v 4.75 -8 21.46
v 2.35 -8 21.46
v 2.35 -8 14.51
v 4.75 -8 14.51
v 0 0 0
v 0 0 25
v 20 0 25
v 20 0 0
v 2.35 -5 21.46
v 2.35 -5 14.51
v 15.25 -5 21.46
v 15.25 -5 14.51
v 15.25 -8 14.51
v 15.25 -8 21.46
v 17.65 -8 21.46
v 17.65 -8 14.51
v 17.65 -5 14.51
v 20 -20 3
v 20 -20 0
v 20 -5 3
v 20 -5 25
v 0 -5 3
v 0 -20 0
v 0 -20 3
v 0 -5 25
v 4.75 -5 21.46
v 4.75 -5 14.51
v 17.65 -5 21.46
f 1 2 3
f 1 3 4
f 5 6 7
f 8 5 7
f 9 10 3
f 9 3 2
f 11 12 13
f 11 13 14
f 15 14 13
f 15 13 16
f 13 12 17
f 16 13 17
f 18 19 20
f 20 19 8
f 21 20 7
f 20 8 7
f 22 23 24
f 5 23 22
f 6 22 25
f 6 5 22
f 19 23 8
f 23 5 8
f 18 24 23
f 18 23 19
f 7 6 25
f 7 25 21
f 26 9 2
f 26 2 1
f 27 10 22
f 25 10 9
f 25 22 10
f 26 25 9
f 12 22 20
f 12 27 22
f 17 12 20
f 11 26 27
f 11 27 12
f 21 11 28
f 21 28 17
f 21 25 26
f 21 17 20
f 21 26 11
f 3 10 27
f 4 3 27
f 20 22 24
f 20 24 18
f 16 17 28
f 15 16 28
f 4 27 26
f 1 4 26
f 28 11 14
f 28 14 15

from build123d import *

# Parameters (mm, degrees)
F0_W     = 20
F0_H     = 25
F1_DEPTH = 5
F2_W     = 20
F2_H     = 3
F3_DEPTH = 15
F4_W     = 2.4
F4_H     = 6.95
F5_DEPTH = 3


with BuildPart() as f1:
    # F0 (on Front) → F1 (new body)
    with BuildSketch(Plane.XZ):
        with Locations((10, 12.5)):
            Rectangle(F0_W, F0_H)
    extrude(amount=F1_DEPTH)

    # F2 (on face) → F3 (join)
    with BuildSketch(Plane.XZ.offset(5)):
        with Locations((10, 1.5)):
            Rectangle(F2_W, F2_H)
    extrude(amount=F3_DEPTH)

    # F4 (on face) → F5 (join)
    with BuildSketch(Plane.XZ.offset(5)):
        with Locations((3.55, 17.985)):
            Rectangle(F4_W, F4_H)
        with Locations((16.45, 17.985)):
            Rectangle(F4_W, F4_H)
    extrude(amount=F5_DEPTH)


solid = f1.part
